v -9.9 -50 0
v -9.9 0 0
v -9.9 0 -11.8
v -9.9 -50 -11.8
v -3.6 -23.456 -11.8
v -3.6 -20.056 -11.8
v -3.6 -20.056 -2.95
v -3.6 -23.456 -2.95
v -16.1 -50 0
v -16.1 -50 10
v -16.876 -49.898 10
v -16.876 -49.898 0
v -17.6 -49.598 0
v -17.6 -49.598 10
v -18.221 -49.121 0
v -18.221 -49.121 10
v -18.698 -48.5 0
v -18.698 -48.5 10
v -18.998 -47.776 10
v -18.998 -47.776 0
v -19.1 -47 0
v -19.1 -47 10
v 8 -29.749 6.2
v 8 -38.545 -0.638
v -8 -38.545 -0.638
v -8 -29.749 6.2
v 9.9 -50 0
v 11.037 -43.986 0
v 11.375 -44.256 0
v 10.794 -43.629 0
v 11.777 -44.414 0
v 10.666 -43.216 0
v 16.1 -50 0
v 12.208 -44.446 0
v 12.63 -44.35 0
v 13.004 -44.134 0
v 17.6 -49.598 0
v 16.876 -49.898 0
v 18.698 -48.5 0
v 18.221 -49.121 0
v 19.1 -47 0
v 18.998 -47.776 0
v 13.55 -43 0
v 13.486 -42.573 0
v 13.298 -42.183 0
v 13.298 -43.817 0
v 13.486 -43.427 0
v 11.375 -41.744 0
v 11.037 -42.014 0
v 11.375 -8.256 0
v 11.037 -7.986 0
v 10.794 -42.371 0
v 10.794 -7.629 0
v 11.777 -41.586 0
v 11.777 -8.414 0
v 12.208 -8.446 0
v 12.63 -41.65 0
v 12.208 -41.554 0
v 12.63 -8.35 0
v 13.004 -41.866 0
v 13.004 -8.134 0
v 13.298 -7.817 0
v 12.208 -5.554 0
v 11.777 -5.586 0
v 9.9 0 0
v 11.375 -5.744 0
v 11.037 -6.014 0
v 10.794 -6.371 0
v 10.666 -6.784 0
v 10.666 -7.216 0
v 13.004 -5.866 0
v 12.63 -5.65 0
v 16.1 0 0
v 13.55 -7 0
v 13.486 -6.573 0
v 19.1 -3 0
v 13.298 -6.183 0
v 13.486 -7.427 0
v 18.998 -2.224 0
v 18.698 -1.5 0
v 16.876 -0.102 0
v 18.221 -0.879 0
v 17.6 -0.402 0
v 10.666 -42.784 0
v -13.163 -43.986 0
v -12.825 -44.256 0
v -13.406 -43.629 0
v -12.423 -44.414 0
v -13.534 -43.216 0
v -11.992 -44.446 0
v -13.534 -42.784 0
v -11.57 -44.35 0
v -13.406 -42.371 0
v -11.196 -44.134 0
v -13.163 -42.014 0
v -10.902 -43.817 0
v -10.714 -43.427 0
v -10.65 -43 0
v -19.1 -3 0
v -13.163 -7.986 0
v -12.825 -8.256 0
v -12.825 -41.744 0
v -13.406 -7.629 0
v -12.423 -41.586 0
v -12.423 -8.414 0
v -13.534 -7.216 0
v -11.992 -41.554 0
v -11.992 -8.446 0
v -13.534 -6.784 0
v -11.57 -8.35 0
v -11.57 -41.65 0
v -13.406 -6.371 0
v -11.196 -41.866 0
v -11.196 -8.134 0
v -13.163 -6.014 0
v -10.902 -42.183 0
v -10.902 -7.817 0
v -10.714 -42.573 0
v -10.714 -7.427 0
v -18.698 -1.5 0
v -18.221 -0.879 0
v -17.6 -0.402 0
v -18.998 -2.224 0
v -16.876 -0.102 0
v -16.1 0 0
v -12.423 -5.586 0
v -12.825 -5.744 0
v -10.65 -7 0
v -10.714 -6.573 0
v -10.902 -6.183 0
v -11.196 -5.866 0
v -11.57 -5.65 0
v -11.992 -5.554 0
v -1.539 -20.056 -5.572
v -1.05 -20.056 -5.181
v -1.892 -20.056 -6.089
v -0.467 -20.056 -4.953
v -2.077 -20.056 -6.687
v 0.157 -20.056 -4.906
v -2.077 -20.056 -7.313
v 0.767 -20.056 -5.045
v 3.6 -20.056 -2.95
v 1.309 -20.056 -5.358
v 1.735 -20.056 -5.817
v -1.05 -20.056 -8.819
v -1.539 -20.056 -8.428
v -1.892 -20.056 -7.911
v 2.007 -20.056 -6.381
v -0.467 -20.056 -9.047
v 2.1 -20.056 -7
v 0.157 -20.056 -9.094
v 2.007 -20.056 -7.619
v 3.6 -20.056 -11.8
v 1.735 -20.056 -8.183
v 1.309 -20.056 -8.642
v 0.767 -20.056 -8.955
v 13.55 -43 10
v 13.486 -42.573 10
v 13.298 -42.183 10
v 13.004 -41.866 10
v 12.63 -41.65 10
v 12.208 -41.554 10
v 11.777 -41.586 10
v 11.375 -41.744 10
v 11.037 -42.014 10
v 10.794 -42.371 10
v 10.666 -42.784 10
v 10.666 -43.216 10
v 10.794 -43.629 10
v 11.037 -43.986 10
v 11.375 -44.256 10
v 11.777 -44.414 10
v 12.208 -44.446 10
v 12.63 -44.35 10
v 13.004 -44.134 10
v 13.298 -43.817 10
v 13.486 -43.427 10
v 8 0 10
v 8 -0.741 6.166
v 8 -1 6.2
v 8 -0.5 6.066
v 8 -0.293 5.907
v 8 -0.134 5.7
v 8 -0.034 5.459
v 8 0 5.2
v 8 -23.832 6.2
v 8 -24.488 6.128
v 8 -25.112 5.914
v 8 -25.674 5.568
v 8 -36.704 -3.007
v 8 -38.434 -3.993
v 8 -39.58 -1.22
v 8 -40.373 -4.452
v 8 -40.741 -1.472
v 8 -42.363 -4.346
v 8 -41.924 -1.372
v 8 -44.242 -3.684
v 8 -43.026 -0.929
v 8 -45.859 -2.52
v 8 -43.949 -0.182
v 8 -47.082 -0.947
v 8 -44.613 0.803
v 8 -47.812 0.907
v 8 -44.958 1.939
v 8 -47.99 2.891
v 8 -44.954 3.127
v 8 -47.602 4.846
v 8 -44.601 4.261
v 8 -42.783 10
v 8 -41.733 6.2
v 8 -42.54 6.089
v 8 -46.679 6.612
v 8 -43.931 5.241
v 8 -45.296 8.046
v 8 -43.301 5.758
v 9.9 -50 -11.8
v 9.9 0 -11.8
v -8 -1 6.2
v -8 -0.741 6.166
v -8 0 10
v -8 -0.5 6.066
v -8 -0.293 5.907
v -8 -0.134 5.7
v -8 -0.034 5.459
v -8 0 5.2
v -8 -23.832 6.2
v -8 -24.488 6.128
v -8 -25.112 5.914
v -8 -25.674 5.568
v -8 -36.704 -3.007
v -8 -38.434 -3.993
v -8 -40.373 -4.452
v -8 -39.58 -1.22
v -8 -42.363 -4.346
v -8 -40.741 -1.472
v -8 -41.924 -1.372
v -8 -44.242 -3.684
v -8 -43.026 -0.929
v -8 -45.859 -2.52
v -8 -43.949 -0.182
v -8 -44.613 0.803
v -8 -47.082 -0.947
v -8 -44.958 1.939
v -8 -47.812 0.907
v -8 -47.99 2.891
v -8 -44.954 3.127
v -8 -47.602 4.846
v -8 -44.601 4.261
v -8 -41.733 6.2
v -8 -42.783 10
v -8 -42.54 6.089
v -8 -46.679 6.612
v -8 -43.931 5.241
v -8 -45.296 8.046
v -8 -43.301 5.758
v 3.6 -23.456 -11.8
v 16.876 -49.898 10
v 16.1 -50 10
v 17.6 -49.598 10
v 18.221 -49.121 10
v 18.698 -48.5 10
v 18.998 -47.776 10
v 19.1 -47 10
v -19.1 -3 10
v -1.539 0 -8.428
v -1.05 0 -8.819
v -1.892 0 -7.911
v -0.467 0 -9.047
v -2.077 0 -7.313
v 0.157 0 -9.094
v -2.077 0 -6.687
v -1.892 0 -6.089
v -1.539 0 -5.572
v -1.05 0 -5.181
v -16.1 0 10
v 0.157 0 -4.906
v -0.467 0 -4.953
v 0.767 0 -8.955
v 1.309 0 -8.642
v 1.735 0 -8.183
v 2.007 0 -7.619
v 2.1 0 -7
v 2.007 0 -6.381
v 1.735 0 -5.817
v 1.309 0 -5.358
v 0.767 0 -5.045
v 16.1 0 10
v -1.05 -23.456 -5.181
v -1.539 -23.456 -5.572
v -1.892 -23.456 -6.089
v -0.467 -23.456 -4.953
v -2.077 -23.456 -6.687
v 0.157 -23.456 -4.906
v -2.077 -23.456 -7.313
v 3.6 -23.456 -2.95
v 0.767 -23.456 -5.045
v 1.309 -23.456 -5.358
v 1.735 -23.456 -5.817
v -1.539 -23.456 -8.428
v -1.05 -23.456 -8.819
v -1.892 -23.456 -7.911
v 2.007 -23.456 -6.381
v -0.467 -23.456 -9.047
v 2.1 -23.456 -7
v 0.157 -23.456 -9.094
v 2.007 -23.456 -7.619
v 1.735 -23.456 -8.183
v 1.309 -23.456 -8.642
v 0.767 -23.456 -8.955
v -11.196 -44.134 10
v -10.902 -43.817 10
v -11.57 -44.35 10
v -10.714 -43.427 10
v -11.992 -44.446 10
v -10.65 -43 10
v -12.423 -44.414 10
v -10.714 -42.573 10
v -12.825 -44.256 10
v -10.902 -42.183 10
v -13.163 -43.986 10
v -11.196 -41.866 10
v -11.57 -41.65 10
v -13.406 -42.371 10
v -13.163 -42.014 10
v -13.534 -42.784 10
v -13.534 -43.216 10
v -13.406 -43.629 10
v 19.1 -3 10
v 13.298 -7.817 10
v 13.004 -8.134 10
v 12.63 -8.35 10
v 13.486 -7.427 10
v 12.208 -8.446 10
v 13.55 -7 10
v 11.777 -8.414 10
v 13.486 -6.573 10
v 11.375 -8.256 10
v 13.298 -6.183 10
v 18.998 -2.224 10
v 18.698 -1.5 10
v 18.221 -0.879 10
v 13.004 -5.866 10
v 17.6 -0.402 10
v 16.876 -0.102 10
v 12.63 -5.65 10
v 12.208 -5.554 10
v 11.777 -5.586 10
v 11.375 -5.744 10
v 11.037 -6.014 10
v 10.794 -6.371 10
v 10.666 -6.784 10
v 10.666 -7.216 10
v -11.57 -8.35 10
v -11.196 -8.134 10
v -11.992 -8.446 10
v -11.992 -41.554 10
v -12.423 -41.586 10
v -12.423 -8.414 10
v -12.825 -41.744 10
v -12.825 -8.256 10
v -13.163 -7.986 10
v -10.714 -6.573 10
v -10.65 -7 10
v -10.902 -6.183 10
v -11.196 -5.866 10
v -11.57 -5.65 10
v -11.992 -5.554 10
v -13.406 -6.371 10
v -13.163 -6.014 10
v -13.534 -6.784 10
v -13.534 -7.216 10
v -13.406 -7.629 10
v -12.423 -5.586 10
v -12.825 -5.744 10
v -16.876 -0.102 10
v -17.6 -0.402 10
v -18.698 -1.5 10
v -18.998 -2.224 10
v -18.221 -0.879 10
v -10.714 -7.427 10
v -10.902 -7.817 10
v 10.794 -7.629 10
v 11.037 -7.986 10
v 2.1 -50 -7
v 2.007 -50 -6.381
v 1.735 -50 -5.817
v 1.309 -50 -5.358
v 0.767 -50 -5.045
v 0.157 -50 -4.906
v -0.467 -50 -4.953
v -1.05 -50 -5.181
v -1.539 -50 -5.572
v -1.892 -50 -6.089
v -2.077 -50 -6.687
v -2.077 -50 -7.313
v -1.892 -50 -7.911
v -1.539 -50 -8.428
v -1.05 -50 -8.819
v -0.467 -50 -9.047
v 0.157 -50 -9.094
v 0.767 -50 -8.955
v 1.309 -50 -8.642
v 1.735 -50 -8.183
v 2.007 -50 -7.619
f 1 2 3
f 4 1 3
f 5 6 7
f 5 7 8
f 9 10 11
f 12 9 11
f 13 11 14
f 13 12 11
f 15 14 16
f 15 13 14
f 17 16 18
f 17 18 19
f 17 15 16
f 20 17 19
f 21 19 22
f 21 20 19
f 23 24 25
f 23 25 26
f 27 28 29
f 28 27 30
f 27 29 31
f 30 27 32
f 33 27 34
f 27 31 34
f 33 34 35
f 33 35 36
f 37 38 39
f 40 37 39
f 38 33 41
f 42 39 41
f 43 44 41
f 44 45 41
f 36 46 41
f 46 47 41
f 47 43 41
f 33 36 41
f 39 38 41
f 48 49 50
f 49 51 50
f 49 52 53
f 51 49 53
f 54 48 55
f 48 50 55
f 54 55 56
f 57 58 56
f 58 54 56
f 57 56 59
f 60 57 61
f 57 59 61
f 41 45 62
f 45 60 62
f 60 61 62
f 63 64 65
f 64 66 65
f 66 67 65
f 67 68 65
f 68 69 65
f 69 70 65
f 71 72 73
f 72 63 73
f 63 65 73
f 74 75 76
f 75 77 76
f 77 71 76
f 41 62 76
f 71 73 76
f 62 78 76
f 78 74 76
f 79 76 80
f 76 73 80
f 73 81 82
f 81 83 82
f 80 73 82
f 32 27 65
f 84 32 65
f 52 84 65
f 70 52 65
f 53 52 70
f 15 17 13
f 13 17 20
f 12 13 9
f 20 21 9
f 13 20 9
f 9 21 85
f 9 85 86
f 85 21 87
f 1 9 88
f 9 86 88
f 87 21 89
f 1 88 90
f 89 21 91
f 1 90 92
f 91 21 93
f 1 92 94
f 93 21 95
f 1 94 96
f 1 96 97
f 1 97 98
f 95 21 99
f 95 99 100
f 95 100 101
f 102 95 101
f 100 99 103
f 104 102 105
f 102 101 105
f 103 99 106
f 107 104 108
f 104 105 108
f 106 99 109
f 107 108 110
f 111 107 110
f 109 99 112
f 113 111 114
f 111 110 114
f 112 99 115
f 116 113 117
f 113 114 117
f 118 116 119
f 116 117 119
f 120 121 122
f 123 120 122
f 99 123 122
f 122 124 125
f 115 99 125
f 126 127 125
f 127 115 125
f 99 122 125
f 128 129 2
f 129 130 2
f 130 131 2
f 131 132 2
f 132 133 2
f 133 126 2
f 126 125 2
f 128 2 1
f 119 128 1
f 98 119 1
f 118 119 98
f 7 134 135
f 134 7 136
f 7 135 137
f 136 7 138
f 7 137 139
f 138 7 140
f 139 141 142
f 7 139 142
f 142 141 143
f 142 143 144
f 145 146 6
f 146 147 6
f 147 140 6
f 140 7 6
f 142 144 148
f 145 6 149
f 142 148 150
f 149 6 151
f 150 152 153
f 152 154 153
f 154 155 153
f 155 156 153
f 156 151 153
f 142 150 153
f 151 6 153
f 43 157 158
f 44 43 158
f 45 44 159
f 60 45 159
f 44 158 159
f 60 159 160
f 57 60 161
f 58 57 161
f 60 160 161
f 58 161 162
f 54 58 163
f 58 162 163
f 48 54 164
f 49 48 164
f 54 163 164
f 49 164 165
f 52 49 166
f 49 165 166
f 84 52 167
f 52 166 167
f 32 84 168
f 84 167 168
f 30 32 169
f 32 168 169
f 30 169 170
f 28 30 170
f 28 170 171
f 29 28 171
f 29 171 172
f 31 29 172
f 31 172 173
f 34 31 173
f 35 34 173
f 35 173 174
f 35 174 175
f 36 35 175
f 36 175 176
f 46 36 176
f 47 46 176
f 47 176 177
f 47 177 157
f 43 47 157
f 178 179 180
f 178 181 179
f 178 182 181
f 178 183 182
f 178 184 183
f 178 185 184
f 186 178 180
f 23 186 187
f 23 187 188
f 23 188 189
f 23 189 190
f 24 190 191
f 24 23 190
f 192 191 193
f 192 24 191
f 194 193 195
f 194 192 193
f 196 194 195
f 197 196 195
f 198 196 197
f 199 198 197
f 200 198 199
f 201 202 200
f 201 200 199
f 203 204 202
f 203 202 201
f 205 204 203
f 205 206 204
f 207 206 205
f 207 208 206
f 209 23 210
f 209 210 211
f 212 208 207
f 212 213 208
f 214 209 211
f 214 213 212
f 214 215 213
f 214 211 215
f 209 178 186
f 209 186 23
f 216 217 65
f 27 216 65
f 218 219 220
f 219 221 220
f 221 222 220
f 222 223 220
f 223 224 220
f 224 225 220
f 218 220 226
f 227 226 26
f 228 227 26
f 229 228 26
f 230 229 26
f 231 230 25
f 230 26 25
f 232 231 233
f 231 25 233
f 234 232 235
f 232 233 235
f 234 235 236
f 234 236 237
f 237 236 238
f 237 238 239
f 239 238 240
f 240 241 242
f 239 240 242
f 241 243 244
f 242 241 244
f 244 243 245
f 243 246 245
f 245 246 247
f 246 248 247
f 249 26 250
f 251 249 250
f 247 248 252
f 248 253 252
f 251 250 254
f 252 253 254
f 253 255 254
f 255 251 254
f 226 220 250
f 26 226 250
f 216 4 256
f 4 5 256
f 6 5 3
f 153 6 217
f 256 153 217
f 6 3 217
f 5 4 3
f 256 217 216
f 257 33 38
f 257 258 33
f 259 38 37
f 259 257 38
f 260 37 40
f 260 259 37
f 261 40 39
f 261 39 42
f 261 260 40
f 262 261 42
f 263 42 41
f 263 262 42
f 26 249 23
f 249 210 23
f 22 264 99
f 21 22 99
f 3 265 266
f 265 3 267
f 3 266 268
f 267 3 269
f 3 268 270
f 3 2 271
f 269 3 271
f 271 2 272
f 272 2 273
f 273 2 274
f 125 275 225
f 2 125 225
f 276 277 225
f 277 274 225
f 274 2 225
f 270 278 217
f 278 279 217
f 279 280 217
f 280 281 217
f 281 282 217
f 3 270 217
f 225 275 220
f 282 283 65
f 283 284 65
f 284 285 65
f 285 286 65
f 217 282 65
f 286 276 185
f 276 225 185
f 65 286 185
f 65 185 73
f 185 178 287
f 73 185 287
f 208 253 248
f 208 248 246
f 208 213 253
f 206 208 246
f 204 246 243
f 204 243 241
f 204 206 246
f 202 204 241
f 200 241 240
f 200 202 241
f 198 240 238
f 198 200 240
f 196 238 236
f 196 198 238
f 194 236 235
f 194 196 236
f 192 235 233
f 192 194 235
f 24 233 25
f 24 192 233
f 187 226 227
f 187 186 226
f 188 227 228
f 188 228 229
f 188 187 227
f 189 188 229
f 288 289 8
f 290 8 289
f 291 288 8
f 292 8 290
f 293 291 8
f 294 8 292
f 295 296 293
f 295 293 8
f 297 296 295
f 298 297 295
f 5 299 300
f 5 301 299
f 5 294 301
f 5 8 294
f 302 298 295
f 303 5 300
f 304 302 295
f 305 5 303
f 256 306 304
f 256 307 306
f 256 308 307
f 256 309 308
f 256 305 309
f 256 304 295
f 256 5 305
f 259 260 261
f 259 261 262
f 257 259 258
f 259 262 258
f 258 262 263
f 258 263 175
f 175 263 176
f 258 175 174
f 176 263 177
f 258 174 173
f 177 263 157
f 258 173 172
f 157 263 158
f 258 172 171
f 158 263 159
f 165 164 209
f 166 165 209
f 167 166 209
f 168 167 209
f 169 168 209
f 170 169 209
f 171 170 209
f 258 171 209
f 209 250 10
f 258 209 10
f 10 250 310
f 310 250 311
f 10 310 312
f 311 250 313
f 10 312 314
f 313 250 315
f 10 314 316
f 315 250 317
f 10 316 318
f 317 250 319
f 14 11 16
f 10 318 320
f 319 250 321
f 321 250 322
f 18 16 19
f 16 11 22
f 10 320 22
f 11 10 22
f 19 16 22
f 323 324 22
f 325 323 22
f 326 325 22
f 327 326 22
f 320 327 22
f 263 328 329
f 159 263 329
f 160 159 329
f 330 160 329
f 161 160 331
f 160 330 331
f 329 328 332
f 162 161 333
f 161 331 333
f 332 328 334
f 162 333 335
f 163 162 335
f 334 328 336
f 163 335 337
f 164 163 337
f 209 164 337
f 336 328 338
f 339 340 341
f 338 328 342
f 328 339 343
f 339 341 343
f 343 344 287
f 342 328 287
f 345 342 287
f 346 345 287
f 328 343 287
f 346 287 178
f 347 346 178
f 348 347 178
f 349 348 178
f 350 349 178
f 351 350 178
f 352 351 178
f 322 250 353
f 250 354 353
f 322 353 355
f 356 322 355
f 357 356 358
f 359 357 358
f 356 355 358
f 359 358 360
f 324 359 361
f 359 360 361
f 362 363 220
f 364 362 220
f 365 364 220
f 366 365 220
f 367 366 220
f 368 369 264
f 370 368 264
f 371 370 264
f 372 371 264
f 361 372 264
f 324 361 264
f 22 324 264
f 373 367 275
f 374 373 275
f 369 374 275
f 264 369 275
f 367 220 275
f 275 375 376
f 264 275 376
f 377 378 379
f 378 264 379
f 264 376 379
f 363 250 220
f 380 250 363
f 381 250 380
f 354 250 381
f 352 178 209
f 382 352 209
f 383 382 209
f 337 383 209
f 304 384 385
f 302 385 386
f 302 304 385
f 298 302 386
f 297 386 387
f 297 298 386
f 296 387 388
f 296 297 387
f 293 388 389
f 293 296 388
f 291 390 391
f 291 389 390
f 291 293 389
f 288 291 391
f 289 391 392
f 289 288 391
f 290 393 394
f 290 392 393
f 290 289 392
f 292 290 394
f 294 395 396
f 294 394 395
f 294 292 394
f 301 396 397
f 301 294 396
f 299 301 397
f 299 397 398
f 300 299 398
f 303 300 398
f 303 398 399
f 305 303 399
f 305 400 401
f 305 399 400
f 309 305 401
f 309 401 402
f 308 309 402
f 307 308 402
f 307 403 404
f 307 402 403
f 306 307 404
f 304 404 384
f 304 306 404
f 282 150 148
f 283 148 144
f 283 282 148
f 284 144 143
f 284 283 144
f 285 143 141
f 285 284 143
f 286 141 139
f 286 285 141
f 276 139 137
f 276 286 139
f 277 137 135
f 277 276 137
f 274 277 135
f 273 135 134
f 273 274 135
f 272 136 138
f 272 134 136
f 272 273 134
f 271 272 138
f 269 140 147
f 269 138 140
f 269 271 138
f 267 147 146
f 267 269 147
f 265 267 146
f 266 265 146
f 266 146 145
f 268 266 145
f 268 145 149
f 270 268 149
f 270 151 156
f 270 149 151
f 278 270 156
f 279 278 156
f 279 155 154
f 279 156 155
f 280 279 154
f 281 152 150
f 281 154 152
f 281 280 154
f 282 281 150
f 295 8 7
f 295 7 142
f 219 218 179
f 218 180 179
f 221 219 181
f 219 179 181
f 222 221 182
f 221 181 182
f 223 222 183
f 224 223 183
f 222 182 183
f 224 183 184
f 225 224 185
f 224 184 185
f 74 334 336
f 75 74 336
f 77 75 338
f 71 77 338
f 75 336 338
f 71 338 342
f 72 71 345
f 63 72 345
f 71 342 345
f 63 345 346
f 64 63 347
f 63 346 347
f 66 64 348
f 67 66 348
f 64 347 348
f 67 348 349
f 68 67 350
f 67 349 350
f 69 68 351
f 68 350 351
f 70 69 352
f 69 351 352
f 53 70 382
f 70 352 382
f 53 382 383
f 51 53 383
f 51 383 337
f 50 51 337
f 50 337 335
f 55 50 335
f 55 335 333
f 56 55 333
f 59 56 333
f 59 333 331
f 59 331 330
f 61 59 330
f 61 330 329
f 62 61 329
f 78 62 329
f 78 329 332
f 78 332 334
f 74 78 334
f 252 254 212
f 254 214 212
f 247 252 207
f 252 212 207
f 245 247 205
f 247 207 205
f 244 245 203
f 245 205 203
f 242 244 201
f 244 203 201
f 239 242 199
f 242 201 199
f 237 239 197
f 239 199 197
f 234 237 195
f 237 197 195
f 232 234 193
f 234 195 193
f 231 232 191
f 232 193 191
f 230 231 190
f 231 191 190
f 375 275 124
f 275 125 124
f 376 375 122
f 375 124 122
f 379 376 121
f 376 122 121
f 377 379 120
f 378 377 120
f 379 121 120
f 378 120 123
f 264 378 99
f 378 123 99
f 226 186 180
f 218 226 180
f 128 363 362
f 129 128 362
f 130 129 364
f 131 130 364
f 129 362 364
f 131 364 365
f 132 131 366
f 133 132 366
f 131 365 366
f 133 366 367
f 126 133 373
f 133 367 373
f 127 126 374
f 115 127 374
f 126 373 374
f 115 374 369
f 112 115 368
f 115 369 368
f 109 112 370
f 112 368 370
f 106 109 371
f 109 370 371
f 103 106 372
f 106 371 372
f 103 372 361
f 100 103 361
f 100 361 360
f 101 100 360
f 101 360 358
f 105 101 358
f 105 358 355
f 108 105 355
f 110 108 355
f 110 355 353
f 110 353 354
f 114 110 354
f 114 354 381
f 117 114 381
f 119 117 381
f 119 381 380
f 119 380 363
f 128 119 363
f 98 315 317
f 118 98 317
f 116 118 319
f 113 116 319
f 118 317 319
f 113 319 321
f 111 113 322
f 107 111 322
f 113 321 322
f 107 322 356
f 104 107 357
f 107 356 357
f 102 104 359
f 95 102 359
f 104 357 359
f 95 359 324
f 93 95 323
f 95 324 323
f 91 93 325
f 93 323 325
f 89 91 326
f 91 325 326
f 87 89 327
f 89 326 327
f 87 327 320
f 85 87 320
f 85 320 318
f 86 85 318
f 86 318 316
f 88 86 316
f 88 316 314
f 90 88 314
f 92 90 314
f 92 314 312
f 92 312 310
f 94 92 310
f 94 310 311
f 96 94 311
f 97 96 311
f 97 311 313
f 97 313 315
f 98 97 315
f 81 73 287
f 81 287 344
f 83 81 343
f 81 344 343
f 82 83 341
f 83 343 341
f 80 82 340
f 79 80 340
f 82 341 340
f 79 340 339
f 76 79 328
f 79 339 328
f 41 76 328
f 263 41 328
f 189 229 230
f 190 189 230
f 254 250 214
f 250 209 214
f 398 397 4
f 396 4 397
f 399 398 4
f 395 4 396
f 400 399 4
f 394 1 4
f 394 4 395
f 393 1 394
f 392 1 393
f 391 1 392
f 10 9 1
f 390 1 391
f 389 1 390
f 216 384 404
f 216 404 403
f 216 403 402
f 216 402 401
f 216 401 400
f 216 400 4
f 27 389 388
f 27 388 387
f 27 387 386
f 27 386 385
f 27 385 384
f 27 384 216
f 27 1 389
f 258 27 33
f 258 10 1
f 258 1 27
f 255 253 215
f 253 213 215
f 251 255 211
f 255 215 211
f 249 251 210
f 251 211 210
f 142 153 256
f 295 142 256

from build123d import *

# Parameters (mm, degrees)
PAD005_DEPTH    = 50
SKETCH012_R     = 2.1
POCKET004_DEPTH = 50.001
POCKET005_DEPTH = 8
SKETCH014_W     = 7.2
SKETCH014_H     = 3.4
POCKET006_DEPTH = 8.85
SKETCH015_R     = 1.45
POCKET007_DEPTH = 21.801
FILLET012_R     = 3
FILLET013_R     = 3
FILLET015_R     = 1


with BuildPart() as part:
    # Sketch010 → Pad005 (new body)
    with BuildSketch(Plane.XZ):
        Polygon((-9.9, -11.8), (9.9, -11.8), (9.9, 0), (19.1, 0), (19.1, 10), (-19.1, 10), (-19.1, 0), (-9.9, 0), align=None)
    extrude(amount=PAD005_DEPTH)

    # Sketch012 → Pocket004 (cut, through all)
    with BuildSketch(Plane.XZ):
        with Locations((0, -7)):
            Circle(SKETCH012_R)
    extrude(amount=POCKET004_DEPTH, mode=Mode.SUBTRACT)

    # Sketch013 → Pocket005 (cut, symmetric)
    with BuildSketch(Plane.YZ):
        with BuildLine():
            Line((-24.861402, 6.200002), (-36.703512, -3.006758))
            ThreePointArc((-45.296488, 8.045878), (-46.526318, -1.776928), (-36.703512, -3.006758))
            Line((-42.783017, 10), (-45.296488, 8.045878))
            Line((0, 10), (-42.783017, 10))
            Line((0.003511, 6.200002), (0, 10))
            Line((-24.861402, 6.200002), (0.003511, 6.200002))
        make_face()
        with BuildLine():
            ThreePointArc((-43.455136, 5.677456), (-44.157896, 0.064424), (-38.544864, -0.638336))
            Line((-38.544864, -0.638336), (-29.749115, 6.200002))
            Line((-42.783017, 6.200002), (-29.749115, 6.200002))
            Line((-43.455136, 5.677456), (-42.783017, 6.200002))
        make_face(mode=Mode.SUBTRACT)
    extrude(amount=POCKET005_DEPTH, both=True, mode=Mode.SUBTRACT)

    # Sketch014 (on Face1 of Pocket005) → Pocket006 (cut)
    with BuildSketch(Plane(origin=(0, 0, -11.8), x_dir=(1, 0, 0), z_dir=(0, 0, -1))):
        with Locations((0, 21.756458)):
            Rectangle(SKETCH014_W, SKETCH014_H)
    extrude(amount=-POCKET006_DEPTH, mode=Mode.SUBTRACT)

    # Sketch015 (on DatumPlane) → Pocket007 (cut, through all)
    with BuildSketch(Plane.XY.offset(10)):
        with Locations((-12.1, -7)):
            Circle(SKETCH015_R)
        with Locations((12.1, -7)):
            Circle(SKETCH015_R)
        with Locations((12.1, -43)):
            Circle(SKETCH015_R)
        with Locations((-12.1, -43)):
            Circle(SKETCH015_R)
    extrude(amount=-POCKET007_DEPTH, mode=Mode.SUBTRACT)

    # Fillet012
    fillet012_edges = [part.edges().sort_by_distance(p)[0] for p in [
        (19.1, -50, 5),
        (19.1, 0, 5),
        (-19.1, -50, 5),
        (-19.1, 0, 5),
    ]]
    fillet(fillet012_edges, radius=FILLET012_R)

    # Fillet013
    fillet013_edges = [part.edges().sort_by_distance(p)[0] for p in [
        (0, -42.783017, 6.200002),
        (0, -24.861402, 6.200002),
    ]]
    fillet(fillet013_edges, radius=FILLET013_R)

    # Fillet015
    fillet015_edges = [part.edges().sort_by_distance(p)[0] for p in [
        (0, 0, 6.200002),
    ]]
    fillet(fillet015_edges, radius=FILLET015_R)


solid = part.part
